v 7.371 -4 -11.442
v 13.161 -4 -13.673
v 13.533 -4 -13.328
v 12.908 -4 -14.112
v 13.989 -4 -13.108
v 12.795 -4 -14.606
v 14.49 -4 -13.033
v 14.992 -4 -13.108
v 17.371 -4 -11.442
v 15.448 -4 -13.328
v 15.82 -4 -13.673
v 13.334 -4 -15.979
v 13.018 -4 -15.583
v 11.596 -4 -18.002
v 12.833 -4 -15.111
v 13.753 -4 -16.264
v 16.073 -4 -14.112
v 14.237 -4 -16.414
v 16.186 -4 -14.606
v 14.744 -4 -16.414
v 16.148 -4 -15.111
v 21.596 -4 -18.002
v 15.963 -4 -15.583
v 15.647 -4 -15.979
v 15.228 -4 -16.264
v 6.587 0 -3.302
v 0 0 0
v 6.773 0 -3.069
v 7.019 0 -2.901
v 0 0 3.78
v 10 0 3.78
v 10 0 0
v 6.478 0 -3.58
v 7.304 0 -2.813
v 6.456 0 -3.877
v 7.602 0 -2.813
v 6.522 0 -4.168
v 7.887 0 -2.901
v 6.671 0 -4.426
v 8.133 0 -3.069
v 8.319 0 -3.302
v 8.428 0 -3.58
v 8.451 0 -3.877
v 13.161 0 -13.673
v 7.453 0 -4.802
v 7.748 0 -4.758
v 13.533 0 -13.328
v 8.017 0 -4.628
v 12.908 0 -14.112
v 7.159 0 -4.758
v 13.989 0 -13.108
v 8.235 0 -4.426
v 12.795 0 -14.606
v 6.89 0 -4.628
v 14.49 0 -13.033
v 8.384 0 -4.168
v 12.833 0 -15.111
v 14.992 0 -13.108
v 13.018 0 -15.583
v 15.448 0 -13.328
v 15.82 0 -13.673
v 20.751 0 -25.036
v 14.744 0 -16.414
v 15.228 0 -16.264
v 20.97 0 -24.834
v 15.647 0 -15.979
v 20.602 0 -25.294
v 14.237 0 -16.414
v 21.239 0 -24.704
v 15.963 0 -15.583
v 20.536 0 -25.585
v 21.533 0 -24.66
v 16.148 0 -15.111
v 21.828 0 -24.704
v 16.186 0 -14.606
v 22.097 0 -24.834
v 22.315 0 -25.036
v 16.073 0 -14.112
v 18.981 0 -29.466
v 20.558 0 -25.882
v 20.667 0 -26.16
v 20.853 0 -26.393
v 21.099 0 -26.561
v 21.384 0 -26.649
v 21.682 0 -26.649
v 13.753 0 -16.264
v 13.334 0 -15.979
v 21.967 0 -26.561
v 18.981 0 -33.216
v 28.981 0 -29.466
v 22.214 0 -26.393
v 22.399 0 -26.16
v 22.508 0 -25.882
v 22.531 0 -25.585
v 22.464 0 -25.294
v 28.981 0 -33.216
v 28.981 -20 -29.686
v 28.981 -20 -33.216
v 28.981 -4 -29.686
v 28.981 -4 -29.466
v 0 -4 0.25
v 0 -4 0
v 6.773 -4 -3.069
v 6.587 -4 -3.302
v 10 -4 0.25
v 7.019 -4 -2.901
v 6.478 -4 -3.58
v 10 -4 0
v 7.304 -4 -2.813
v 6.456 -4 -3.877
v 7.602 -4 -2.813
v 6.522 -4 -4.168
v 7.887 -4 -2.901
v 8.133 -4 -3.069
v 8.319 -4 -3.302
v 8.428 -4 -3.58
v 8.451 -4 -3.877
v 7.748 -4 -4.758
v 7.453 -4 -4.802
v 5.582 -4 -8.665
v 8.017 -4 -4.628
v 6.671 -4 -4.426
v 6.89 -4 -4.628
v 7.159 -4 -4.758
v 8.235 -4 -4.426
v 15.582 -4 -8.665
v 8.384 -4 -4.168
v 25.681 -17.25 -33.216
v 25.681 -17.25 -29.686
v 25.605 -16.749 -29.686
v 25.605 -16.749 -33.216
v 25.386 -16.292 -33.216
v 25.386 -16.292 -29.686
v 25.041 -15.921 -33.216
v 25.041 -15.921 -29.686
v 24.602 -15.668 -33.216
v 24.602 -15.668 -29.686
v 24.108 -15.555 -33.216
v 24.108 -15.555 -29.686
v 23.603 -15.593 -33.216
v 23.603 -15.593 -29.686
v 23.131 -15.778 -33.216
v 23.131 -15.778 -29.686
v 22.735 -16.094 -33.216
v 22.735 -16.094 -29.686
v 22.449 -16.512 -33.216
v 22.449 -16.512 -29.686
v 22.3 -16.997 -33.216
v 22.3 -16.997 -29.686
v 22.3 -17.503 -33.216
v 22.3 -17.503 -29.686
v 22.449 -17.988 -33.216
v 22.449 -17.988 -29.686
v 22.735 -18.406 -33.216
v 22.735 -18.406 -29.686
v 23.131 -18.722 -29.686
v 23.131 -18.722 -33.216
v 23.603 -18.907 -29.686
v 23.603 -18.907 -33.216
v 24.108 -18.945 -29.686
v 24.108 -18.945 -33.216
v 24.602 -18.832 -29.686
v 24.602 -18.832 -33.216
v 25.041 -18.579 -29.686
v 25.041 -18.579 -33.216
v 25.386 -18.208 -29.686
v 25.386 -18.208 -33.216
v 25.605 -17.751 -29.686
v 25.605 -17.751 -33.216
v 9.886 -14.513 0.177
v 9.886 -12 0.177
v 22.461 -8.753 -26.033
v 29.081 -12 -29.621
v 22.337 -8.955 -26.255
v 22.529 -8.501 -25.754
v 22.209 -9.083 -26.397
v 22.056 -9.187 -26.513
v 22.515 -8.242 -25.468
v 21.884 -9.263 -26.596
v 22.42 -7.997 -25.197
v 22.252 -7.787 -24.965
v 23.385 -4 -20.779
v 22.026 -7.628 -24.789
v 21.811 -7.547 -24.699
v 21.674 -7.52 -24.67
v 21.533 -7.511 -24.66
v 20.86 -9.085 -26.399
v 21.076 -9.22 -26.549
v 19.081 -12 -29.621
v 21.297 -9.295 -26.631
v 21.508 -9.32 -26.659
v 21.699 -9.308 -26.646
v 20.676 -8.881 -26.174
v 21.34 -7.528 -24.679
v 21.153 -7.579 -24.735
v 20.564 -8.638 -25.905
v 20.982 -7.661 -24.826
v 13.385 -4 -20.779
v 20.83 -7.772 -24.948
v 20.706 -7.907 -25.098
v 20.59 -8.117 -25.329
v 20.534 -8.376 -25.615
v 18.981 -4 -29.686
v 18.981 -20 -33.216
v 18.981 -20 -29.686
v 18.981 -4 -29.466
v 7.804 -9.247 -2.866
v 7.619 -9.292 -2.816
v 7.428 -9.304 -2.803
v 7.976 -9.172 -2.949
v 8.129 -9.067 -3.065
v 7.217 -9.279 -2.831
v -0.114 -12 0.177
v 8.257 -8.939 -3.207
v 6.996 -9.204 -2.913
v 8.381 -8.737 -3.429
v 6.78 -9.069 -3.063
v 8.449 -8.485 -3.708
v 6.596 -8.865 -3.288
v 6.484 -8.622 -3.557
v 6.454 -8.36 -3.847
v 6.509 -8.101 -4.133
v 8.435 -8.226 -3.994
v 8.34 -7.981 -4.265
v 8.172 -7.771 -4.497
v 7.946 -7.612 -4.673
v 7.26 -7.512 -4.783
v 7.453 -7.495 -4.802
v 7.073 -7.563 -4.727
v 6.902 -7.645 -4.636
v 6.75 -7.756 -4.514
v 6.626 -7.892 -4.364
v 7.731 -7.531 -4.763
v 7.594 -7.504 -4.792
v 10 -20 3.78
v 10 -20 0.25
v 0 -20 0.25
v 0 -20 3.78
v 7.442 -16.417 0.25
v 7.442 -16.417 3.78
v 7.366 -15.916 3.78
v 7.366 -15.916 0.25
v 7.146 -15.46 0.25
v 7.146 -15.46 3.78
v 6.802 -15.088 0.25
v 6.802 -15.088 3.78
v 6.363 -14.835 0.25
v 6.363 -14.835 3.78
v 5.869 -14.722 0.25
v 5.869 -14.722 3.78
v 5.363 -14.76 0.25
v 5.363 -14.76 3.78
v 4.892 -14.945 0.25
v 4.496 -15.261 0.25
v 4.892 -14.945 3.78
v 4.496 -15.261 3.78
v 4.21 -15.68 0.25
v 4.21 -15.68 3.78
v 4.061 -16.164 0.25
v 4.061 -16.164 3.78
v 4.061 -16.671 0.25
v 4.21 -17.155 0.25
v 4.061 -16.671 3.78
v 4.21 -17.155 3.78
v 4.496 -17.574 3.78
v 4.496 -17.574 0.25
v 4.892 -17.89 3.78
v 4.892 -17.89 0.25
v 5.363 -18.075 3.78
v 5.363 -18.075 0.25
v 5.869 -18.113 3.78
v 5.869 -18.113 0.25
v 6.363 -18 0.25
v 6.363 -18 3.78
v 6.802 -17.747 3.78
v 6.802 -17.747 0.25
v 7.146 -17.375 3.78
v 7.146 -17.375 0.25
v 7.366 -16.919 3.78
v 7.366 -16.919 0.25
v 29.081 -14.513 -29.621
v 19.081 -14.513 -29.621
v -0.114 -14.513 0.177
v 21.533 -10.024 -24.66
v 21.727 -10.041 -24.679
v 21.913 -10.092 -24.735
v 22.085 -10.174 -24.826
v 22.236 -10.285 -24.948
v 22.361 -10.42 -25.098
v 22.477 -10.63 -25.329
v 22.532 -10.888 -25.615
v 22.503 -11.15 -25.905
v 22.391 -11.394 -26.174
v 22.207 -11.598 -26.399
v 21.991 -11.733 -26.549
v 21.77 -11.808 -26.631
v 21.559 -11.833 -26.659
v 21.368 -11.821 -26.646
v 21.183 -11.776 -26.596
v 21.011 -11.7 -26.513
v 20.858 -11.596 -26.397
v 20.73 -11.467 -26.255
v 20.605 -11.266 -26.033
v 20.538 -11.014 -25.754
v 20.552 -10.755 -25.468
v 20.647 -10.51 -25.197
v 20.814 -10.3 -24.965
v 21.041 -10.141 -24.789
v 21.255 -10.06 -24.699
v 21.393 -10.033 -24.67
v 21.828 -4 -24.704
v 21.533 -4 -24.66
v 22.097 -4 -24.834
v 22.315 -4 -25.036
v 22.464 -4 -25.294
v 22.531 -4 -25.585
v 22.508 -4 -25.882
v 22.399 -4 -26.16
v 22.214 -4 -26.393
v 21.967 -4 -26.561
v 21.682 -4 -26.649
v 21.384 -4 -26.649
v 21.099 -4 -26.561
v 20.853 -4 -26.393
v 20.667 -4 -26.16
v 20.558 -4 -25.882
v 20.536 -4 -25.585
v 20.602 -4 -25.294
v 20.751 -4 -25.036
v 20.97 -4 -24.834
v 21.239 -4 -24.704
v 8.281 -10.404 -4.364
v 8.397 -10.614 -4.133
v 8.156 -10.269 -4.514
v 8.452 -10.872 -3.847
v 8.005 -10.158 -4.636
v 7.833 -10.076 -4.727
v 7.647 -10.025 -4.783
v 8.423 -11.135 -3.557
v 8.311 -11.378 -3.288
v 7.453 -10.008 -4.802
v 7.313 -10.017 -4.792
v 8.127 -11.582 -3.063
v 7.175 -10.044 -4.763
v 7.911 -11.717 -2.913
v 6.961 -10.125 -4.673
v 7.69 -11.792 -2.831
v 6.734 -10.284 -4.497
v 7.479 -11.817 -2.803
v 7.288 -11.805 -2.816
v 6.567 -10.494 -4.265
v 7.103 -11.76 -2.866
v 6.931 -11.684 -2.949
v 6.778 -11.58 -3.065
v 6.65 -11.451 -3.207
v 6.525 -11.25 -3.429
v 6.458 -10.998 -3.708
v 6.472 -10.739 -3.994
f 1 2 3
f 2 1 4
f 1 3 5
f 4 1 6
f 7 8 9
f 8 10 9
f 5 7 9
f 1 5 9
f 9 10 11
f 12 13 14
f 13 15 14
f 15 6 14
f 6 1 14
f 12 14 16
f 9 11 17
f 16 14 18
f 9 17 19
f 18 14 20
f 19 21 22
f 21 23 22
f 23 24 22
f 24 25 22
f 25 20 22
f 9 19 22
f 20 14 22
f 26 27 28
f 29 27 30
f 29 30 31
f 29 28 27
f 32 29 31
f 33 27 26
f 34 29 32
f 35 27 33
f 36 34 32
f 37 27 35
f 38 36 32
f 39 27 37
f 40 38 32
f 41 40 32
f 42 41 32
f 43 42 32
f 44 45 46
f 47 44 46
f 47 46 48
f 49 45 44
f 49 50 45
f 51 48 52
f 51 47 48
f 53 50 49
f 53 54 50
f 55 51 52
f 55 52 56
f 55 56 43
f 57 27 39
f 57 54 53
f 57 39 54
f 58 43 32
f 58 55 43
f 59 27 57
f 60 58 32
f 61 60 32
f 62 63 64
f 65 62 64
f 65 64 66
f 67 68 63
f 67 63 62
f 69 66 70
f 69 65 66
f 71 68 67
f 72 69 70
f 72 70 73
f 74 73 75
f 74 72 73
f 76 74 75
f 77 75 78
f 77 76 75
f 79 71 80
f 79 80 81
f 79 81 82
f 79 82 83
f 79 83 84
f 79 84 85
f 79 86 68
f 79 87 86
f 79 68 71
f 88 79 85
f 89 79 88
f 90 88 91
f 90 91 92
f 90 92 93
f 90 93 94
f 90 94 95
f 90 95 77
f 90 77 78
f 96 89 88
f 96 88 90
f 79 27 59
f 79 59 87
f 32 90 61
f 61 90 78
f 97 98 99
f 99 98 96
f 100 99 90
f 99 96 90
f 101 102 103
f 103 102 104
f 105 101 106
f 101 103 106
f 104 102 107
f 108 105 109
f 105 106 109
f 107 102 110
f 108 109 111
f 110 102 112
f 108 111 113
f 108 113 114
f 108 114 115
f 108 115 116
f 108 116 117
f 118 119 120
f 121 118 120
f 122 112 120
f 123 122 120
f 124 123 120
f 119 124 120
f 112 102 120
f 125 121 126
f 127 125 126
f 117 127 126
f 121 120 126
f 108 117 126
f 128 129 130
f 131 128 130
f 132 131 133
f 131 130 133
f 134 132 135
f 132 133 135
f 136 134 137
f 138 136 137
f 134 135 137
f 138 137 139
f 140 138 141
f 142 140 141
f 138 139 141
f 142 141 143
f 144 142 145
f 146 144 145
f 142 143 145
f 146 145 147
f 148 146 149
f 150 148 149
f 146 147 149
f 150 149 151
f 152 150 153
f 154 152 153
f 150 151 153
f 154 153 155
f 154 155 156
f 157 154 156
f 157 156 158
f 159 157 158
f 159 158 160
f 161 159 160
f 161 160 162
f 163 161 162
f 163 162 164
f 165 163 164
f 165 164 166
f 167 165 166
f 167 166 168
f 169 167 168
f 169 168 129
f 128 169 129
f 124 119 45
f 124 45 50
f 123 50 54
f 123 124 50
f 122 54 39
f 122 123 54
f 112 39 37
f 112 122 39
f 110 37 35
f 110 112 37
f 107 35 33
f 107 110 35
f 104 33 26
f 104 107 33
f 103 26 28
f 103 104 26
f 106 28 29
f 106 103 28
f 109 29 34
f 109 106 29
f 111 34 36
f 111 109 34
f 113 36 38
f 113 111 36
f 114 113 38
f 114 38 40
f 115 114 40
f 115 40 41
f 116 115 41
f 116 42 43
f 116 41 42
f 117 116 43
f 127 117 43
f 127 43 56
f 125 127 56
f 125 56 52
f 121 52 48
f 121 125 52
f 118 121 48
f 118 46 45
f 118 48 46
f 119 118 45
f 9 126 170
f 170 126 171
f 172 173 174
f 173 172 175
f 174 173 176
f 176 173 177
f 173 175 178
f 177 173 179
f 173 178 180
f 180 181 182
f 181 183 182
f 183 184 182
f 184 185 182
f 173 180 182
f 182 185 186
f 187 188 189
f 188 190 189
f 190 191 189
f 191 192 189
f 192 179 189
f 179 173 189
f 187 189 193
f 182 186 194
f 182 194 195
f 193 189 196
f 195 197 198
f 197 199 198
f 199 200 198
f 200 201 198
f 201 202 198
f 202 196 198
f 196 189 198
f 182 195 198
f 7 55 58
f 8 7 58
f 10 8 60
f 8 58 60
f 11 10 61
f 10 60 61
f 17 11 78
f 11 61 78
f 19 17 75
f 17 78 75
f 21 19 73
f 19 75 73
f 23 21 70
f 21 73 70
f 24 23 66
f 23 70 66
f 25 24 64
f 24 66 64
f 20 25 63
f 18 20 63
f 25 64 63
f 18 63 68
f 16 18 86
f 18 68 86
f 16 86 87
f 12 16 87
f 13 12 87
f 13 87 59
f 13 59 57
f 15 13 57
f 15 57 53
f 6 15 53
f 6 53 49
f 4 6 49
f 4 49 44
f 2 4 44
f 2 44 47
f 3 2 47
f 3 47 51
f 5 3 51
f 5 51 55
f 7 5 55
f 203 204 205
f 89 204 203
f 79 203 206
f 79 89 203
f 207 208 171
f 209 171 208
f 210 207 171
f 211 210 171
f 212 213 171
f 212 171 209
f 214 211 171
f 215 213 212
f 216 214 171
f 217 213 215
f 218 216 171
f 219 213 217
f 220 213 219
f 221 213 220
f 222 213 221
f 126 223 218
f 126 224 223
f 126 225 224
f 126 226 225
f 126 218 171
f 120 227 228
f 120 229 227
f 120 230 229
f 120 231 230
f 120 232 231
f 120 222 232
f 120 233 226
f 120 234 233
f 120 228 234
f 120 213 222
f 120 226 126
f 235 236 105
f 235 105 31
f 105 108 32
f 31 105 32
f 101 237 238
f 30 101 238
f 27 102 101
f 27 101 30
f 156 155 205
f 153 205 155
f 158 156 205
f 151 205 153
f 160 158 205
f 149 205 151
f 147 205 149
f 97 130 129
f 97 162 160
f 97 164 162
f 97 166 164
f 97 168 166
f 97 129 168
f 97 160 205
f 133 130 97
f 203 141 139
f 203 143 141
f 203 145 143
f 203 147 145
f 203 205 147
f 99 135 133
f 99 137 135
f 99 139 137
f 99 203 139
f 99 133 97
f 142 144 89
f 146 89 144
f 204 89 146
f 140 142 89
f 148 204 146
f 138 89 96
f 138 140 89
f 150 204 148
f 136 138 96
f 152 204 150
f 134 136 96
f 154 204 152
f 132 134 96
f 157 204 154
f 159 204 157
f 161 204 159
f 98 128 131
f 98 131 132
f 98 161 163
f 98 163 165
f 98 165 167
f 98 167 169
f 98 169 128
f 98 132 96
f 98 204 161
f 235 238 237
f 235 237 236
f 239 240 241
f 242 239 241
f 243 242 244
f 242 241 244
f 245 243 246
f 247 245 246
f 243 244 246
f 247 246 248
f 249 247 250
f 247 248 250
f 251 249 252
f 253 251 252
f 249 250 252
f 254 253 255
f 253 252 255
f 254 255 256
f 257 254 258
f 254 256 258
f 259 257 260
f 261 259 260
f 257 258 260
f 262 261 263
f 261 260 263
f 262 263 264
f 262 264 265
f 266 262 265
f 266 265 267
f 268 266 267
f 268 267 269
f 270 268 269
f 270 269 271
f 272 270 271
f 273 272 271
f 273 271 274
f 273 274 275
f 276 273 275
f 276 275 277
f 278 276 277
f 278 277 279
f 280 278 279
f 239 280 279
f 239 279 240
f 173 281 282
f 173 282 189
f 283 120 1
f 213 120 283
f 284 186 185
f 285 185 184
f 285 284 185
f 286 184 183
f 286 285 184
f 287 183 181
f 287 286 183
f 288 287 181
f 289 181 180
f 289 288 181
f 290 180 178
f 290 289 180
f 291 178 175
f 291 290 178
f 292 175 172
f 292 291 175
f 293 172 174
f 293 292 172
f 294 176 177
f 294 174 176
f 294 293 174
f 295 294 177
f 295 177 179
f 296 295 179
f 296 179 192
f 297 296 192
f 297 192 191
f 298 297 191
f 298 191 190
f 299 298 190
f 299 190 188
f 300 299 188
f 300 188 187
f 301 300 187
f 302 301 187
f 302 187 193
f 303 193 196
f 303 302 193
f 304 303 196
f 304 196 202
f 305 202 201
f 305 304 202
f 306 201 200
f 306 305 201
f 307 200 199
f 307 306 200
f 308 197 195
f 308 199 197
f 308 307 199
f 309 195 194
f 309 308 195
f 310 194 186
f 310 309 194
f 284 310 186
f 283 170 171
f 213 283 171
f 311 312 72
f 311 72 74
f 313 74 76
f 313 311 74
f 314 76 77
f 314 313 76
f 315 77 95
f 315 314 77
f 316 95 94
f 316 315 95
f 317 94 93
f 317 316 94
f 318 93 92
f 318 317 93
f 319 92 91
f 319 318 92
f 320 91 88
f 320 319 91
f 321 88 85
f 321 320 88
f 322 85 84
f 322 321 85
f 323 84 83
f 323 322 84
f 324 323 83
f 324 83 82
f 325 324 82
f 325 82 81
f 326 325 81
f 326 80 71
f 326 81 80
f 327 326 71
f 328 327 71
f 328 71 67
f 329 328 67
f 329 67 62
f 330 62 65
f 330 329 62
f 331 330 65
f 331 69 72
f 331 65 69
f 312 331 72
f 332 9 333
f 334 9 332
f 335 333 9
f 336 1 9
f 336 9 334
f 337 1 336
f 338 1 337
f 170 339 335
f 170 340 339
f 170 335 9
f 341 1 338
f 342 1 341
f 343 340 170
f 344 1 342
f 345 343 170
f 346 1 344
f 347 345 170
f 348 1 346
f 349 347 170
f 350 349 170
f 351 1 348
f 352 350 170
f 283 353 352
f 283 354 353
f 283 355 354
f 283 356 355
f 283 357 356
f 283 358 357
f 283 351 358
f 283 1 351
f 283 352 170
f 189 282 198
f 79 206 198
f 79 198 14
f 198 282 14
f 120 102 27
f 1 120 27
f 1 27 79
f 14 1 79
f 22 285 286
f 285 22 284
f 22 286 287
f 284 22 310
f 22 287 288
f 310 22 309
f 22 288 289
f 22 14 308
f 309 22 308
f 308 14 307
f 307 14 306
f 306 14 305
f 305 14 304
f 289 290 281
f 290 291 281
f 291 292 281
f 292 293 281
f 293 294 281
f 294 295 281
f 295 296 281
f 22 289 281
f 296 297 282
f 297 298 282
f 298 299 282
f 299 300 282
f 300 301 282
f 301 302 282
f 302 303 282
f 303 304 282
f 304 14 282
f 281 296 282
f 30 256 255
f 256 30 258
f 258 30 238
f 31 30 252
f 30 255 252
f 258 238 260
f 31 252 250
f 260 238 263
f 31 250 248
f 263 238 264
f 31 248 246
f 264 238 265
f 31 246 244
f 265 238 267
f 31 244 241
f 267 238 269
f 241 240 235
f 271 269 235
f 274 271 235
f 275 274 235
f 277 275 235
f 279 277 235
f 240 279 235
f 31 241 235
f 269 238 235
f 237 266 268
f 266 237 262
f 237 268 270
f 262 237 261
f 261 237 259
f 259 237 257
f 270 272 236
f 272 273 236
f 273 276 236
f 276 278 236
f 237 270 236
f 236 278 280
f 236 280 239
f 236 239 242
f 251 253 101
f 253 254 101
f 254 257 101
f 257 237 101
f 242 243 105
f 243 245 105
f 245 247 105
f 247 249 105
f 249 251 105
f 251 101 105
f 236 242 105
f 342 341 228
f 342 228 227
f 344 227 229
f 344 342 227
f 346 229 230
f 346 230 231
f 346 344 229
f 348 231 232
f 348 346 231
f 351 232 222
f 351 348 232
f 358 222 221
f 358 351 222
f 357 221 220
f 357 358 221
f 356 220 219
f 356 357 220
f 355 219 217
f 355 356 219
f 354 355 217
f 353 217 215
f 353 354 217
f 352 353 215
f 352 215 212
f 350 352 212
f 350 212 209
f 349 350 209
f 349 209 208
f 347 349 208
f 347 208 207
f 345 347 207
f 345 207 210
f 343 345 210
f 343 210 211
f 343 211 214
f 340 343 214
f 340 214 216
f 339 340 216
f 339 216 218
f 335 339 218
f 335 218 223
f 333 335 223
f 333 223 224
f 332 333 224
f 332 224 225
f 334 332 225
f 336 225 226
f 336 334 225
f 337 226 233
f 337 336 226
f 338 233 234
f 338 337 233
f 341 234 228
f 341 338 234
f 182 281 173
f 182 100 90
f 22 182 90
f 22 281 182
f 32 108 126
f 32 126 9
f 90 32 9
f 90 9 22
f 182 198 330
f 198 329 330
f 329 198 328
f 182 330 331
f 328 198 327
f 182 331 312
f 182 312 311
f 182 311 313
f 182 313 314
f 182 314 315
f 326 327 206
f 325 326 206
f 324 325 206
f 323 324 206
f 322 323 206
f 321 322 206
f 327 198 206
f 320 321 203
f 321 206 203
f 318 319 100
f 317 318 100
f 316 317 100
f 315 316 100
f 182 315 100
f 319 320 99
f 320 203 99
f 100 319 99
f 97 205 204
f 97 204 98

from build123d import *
from build123d.topology import SkipClean

# Parameters (mm, degrees)
SCHIZZO9_W                          = 10
SCHIZZO9_H                          = 20
ESTRUSIONE_ESTRUSIONE5_DEPTH        = 35.05
SCHIZZO10_W                         = 35.05
SCHIZZO10_H                         = 16
TAGLIO_ESTRUSIONE1_DEPTH            = 43.05
SCHIZZO11_R                         = 1.7
TAGLIO_ESTRUSIONE2_DEPTH            = 43.05
SCHIZZO16_W                         = 10
SCHIZZO16_H                         = 4
ESTRUSIONE_ESTRUSIONE8_DEPTH        = 4
SCHIZZO17_W                         = 10
SCHIZZO17_H                         = 4
ESTRUSIONE_ESTRUSIONE9_DEPTH        = 4
ESTRUSIONE_ESTRUSIONE10_OUTLINE_W   = 10
ESTRUSIONE_ESTRUSIONE10_OUTLINE_H   = 3.78
ESTRUSIONE_ESTRUSIONE10_OUTLINE_H_2 = 3.75
ESTRUSIONE_ESTRUSIONE10_DEPTH       = 16
ESTRUSIONE_ESTRUSIONE11_DEPTH       = 10.000000119
ESTRUSIONE_ESTRUSIONE12_DEPTH       = 10.000000119
SCHIZZO21_R                         = 1.7
TAGLIO_ESTRUSIONE5_DEPTH            = 4
TAGLIO_ESTRUSIONE7_DEPTH            = 49.638074625
TAGLIO_ESTRUSIONE7_DEPTH_BACK       = 49.638074625
SCHIZZO23_R                         = 1
TAGLIO_ESTRUSIONE8_DEPTH            = 49.638074625
TAGLIO_ESTRUSIONE8_DEPTH_BACK       = 49.638074625
SCHIZZO24_W                         = 10
SCHIZZO24_H                         = 0.25
SCHIZZO24_H_2                       = 0.22
SCHIZZO25_R                         = 1.7
TAGLIO_ESTRUSIONE9_DEPTH            = 10


# Read off the part's stored shape, not the designer's step: Estrusione-Estrusione10
with BuildPart() as part:
    # Schizzo9 → Estrusione-Estrusione5 (new, along a direction that is not the sketch's normal)
    with BuildSketch(Plane.XY):
        with Locations((5, -10)):
            Rectangle(SCHIZZO9_W, SCHIZZO9_H)
    extrude(amount=-ESTRUSIONE_ESTRUSIONE5_DEPTH, dir=(-0.5415393694615634, 0, 0.8406753899830615))

    # Schizzo10 → Taglio-Estrusione1 (cut, along a direction that is not the sketch's normal)
    with BuildSketch(Plane(origin=(7.067351113, 0, 4.552588206), x_dir=(0.5415393694615636, 0, -0.8406753899830613), z_dir=(0.8406753899830615, 0, 0.5415393694615636))):
        with Locations((22.940393695, -12)):
            Rectangle(SCHIZZO10_W, SCHIZZO10_H)
    extrude(amount=-TAGLIO_ESTRUSIONE1_DEPTH, dir=(1, 0, 0), mode=Mode.SUBTRACT)

    # Schizzo11 → Taglio-Estrusione2 (cut)
    with BuildSketch(Plane(origin=(0, 0, 0), x_dir=(1, 0, 0), z_dir=(0, 1, 0))):
        with Locations(Location((14.49047745, 14.732836209, 0), (0, 0, 270))):
            Circle(SCHIZZO11_R)
    extrude(amount=-TAGLIO_ESTRUSIONE2_DEPTH, mode=Mode.SUBTRACT)

    # Schizzo16 → Estrusione-Estrusione8 (add)
    with BuildSketch(Plane(origin=(0, 0, -29.465672419), x_dir=(-1, 0, 0), z_dir=(0, 0, -1))):
        with Locations((-23.9809549, -2)):
            Rectangle(SCHIZZO16_W, SCHIZZO16_H)
    extrude(amount=ESTRUSIONE_ESTRUSIONE8_DEPTH)

    # Schizzo17 → Estrusione-Estrusione9 (add)
    with BuildSketch(Plane.XY):
        with Locations((5, -2)):
            Rectangle(SCHIZZO17_W, SCHIZZO17_H)
    extrude(amount=ESTRUSIONE_ESTRUSIONE9_DEPTH)

    # Estrusione-Estrusione10 outline → Estrusione-Estrusione10 (add)
    with BuildSketch(Plane.XZ.offset(4)):
        with Locations((23.9809549, -31.575672419)):
            Rectangle(ESTRUSIONE_ESTRUSIONE10_OUTLINE_W, ESTRUSIONE_ESTRUSIONE10_OUTLINE_H)
        with Locations((5, 2.125)):
            Rectangle(ESTRUSIONE_ESTRUSIONE10_OUTLINE_W, ESTRUSIONE_ESTRUSIONE10_OUTLINE_H_2)
    extrude(amount=ESTRUSIONE_ESTRUSIONE10_DEPTH)

    # Schizzo19 → Estrusione-Estrusione11 (add, along a direction that is not the sketch's normal)
    with BuildSketch(Plane(origin=(0, 0, 0), x_dir=(-0.5415393694615636, 0, 0.8406753899830613), z_dir=(-0.8406753899830615, 0, -0.5415393694615636))):
        Polygon((-35.234948586, -12), (-24.717369686, -4), (-21.413778213, -4), (-35.234948586, -14.512815167), align=None)
    extrude(amount=-ESTRUSIONE_ESTRUSIONE11_DEPTH, dir=(-1, 0, 0))

    # Schizzo20 → Estrusione-Estrusione12 (add, along a direction that is not the sketch's normal)
    with SkipClean():  # the faces are left unmerged after this step: merging them gives an invalid solid
        with BuildSketch(Plane(origin=(0, 0, 0), x_dir=(-0.5415393694615636, 0, 0.8406753899830613), z_dir=(-0.8406753899830615, 0, -0.5415393694615636))):
            Polygon((0.210168847, -12), (-10.307410052, -4), (-13.611001525, -4), (0.210168847, -14.512815167), align=None)
        extrude(amount=-ESTRUSIONE_ESTRUSIONE12_DEPTH, dir=(-1, 0, 0))

    # Schizzo21 → Taglio-Estrusione5 (cut)
    with SkipClean():  # the faces are left unmerged after this step: merging them gives an invalid solid
        with BuildSketch(Plane.XY.offset(-29.685672419)):
            with Locations((23.9809549, -17.25)):
                Circle(SCHIZZO21_R)
        extrude(amount=-TAGLIO_ESTRUSIONE5_DEPTH, mode=Mode.SUBTRACT)

    # Schizzo23 → Taglio-Estrusione7 (cut, two sides: drawn at the far end of the back side and taken through both)
    with SkipClean():  # the faces are left unmerged after this step: merging them gives an invalid solid
        with BuildSketch(Plane(origin=(0, 0, 0), x_dir=(1, 0, 0), z_dir=(0, 1, 0)).offset(-TAGLIO_ESTRUSIONE7_DEPTH_BACK)):
            with Locations(Location((7.453304803, 3.802227757, 0), (0, 0, 90))):
                Circle(SCHIZZO23_R)
            with Locations(Location((21.533327934, 25.659787159, 0), (0, 0, 270))):
                Circle(SCHIZZO23_R)
        extrude(amount=TAGLIO_ESTRUSIONE7_DEPTH + TAGLIO_ESTRUSIONE7_DEPTH_BACK, mode=Mode.SUBTRACT)

    # Schizzo24 → Taglio-Estrusione8 (cut, two sides: drawn at the far end of the back side and taken through both)
    with SkipClean():  # the faces are left unmerged after this step: merging them gives an invalid solid
        with BuildSketch(Plane(origin=(0, 0, 0), x_dir=(1, 0, 0), z_dir=(0, 1, 0)).offset(-TAGLIO_ESTRUSIONE8_DEPTH_BACK)):
            with Locations((23.9809549, 33.340672419)):
                Rectangle(SCHIZZO24_W, SCHIZZO24_H)
            with Locations((5, -3.89)):
                Rectangle(SCHIZZO24_W, SCHIZZO24_H_2)
        extrude(amount=TAGLIO_ESTRUSIONE8_DEPTH + TAGLIO_ESTRUSIONE8_DEPTH_BACK, mode=Mode.SUBTRACT)

    # Schizzo25 → Taglio-Estrusione9 (cut)
    with SkipClean():  # the faces are left unmerged after this step: merging them gives an invalid solid
        with BuildSketch(Plane.XY.offset(3.78)):
            with Locations((5.741708588, -16.417479931)):
                Circle(SCHIZZO25_R)
        extrude(amount=-TAGLIO_ESTRUSIONE9_DEPTH, mode=Mode.SUBTRACT)


solid = part.part
